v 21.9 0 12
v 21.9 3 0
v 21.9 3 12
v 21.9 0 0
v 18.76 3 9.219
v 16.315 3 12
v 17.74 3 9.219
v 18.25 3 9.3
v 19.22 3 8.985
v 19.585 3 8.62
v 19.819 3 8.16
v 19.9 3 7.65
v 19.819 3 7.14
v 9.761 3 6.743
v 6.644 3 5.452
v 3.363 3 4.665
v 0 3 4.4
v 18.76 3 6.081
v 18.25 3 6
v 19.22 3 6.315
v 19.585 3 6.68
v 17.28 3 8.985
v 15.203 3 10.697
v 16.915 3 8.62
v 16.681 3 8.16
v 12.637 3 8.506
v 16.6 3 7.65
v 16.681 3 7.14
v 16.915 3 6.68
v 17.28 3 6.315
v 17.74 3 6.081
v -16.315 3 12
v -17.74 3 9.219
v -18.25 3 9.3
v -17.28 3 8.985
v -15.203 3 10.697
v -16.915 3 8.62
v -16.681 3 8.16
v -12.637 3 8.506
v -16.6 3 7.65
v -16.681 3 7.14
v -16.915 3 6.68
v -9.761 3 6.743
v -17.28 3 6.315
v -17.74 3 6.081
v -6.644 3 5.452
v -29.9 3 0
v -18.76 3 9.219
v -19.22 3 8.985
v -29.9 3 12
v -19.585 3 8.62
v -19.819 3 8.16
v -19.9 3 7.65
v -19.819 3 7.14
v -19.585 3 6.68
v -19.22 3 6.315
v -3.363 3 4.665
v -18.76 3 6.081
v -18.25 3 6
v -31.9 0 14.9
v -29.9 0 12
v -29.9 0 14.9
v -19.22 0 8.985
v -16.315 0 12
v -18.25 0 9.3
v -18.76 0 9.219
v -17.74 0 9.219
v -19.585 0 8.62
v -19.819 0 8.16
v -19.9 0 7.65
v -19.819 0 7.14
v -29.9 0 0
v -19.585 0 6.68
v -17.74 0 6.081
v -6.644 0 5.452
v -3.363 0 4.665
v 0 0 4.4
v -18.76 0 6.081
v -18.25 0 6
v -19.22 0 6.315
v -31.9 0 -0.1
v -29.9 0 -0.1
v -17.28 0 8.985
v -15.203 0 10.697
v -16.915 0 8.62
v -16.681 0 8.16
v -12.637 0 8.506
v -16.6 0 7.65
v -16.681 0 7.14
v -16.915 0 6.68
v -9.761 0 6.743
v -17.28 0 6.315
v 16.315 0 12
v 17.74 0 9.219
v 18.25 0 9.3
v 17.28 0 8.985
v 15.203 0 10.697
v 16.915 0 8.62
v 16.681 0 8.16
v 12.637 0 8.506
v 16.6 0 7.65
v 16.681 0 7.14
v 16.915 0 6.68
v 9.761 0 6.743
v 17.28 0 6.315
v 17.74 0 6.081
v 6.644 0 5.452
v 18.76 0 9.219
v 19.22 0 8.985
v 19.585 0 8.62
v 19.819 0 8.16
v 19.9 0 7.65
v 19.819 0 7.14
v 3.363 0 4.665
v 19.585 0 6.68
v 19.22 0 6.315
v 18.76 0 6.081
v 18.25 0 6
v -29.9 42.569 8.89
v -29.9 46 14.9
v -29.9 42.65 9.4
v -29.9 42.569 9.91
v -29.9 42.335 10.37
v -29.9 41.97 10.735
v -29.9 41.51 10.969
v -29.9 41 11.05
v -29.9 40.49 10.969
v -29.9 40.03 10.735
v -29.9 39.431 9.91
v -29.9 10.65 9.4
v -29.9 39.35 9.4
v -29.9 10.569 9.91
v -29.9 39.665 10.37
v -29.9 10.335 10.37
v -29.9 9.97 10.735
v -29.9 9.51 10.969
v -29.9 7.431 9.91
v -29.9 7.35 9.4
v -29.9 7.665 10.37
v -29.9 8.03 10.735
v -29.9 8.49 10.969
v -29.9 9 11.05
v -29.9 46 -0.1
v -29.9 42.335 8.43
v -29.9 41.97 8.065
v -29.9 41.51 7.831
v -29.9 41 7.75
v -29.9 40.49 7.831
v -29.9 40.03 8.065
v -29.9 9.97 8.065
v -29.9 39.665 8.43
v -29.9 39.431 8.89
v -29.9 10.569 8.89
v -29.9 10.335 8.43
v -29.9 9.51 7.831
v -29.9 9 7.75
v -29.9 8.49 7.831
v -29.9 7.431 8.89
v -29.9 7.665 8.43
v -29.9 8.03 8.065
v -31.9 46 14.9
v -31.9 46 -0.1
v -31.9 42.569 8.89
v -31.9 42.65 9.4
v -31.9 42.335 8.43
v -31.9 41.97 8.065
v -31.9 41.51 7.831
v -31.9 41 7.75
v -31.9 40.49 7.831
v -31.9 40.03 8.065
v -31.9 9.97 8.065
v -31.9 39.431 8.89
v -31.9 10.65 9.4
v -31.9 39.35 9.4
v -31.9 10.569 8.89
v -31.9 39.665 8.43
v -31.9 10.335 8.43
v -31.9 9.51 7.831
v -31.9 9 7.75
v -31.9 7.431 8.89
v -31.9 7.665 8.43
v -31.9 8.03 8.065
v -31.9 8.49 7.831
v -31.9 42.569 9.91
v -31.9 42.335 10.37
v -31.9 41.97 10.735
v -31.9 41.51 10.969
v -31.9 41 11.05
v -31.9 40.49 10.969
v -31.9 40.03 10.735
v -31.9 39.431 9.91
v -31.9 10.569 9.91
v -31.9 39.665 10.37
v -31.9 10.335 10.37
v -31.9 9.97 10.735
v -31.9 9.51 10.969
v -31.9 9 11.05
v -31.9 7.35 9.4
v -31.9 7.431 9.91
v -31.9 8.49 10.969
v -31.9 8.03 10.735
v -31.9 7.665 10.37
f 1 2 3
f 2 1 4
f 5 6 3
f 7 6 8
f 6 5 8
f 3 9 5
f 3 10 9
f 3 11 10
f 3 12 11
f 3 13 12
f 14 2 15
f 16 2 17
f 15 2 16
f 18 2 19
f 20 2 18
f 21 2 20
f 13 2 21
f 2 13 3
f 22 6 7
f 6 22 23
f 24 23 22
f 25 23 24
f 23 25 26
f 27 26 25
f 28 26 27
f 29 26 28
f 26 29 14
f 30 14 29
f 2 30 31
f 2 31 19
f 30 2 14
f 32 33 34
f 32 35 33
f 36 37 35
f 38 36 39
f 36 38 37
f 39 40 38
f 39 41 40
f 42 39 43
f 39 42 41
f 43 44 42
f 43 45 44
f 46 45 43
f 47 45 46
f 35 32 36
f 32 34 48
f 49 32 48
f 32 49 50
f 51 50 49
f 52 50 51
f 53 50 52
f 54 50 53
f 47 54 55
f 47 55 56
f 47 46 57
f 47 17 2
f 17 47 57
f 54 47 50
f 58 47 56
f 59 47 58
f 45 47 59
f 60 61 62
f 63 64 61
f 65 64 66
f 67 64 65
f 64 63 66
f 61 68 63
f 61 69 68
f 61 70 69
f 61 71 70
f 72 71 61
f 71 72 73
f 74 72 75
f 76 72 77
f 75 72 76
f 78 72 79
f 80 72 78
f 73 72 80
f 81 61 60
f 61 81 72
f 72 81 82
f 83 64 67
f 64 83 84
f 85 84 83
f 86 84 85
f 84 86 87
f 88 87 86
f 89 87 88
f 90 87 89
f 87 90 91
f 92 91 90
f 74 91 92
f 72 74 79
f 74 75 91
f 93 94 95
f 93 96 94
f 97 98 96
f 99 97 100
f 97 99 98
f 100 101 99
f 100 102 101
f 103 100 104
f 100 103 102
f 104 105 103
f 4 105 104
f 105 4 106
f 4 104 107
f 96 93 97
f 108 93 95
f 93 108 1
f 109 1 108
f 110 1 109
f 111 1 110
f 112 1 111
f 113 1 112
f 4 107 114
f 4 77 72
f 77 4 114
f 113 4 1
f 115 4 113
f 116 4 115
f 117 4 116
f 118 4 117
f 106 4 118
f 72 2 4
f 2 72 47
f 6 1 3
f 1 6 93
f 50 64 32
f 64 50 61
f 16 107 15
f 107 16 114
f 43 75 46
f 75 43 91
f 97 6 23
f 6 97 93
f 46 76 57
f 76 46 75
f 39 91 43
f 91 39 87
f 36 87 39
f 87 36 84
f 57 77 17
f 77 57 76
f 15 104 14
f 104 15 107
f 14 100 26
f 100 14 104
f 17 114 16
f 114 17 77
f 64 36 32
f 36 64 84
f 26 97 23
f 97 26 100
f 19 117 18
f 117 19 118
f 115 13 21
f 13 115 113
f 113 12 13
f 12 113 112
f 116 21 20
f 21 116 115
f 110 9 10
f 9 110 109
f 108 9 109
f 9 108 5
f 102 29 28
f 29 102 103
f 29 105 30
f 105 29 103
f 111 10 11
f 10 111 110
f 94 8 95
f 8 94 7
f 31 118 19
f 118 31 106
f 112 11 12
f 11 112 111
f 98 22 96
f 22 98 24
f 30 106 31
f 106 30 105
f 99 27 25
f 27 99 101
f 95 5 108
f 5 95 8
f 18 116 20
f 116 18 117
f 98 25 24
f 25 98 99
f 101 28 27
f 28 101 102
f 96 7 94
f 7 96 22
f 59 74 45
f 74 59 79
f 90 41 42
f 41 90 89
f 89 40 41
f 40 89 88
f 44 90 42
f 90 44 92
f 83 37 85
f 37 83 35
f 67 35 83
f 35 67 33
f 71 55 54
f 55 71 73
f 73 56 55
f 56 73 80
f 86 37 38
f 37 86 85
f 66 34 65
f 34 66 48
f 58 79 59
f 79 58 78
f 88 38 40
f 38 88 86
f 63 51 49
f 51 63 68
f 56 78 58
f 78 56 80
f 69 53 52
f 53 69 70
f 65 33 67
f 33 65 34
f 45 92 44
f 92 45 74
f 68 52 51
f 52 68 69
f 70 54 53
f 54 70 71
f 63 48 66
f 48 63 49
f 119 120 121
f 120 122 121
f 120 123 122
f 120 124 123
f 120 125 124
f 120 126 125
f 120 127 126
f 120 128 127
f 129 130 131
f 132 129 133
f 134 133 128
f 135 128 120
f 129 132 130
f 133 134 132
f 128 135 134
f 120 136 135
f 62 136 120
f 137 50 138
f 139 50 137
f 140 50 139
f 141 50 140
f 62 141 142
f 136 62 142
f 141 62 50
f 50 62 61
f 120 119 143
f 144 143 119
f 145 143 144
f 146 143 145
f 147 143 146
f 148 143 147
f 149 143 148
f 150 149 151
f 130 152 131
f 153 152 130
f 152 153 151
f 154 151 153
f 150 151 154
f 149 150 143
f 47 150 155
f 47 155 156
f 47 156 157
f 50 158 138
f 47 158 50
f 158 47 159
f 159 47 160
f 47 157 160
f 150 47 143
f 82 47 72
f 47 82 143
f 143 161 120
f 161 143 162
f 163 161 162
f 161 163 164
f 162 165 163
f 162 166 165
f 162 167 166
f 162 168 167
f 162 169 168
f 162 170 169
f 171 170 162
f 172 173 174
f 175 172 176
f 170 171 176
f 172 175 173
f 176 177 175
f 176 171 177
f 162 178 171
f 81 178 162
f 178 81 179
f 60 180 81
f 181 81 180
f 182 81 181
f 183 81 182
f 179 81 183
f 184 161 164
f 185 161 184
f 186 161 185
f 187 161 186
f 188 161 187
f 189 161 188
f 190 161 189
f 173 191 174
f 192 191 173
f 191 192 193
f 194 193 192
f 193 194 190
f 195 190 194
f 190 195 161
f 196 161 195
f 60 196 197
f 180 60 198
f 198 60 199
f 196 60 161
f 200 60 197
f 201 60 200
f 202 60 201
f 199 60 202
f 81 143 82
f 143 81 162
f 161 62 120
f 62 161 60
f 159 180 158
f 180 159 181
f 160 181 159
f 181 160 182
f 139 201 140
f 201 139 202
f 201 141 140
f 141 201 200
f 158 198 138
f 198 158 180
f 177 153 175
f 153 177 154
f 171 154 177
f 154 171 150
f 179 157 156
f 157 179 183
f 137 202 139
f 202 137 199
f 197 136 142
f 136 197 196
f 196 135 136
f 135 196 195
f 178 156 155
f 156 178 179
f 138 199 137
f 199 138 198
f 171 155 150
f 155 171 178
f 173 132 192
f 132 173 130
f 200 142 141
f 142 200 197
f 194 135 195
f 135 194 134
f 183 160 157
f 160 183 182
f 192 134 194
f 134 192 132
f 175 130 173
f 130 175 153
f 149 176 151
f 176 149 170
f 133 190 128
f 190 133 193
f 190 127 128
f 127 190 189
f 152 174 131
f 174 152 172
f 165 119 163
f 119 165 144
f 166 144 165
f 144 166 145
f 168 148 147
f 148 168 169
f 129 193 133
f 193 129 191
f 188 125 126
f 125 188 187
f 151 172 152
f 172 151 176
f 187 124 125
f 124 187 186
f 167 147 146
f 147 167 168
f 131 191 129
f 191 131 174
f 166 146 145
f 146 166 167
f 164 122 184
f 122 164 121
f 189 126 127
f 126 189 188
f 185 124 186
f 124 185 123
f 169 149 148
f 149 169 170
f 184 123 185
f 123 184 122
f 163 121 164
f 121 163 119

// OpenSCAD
motor_diameter = 42+1;
height = 10;
module motor_fan_holder(){
difference(){
translate([-43.8/2-height,16.9-3])cube([43.8+height,12,3]);
cylinder(r=motor_diameter/2,h=10,$fn=40);
translate([36.5/2,36.5/2])cylinder(r=3.3/2,h=10, $fn=20);
translate([-36.5/2,36.5/2])cylinder(r=3.3/2,h=10, $fn=20);   
}

 translate([-43.8/2-height,11])difference(){
    
   cube([2,15,46]);
    translate([-1,15/2-2,9])rotate([0,90])cylinder(r=3.3/2,h=10,$fn=20); 
    translate([-1,15/2-2,9+32])rotate([0,90])cylinder(r=3.3/2,h=10,$fn=20); 
}
}

rotate([-90,0])translate([0,-16.9+3-12])motor_fan_holder();
